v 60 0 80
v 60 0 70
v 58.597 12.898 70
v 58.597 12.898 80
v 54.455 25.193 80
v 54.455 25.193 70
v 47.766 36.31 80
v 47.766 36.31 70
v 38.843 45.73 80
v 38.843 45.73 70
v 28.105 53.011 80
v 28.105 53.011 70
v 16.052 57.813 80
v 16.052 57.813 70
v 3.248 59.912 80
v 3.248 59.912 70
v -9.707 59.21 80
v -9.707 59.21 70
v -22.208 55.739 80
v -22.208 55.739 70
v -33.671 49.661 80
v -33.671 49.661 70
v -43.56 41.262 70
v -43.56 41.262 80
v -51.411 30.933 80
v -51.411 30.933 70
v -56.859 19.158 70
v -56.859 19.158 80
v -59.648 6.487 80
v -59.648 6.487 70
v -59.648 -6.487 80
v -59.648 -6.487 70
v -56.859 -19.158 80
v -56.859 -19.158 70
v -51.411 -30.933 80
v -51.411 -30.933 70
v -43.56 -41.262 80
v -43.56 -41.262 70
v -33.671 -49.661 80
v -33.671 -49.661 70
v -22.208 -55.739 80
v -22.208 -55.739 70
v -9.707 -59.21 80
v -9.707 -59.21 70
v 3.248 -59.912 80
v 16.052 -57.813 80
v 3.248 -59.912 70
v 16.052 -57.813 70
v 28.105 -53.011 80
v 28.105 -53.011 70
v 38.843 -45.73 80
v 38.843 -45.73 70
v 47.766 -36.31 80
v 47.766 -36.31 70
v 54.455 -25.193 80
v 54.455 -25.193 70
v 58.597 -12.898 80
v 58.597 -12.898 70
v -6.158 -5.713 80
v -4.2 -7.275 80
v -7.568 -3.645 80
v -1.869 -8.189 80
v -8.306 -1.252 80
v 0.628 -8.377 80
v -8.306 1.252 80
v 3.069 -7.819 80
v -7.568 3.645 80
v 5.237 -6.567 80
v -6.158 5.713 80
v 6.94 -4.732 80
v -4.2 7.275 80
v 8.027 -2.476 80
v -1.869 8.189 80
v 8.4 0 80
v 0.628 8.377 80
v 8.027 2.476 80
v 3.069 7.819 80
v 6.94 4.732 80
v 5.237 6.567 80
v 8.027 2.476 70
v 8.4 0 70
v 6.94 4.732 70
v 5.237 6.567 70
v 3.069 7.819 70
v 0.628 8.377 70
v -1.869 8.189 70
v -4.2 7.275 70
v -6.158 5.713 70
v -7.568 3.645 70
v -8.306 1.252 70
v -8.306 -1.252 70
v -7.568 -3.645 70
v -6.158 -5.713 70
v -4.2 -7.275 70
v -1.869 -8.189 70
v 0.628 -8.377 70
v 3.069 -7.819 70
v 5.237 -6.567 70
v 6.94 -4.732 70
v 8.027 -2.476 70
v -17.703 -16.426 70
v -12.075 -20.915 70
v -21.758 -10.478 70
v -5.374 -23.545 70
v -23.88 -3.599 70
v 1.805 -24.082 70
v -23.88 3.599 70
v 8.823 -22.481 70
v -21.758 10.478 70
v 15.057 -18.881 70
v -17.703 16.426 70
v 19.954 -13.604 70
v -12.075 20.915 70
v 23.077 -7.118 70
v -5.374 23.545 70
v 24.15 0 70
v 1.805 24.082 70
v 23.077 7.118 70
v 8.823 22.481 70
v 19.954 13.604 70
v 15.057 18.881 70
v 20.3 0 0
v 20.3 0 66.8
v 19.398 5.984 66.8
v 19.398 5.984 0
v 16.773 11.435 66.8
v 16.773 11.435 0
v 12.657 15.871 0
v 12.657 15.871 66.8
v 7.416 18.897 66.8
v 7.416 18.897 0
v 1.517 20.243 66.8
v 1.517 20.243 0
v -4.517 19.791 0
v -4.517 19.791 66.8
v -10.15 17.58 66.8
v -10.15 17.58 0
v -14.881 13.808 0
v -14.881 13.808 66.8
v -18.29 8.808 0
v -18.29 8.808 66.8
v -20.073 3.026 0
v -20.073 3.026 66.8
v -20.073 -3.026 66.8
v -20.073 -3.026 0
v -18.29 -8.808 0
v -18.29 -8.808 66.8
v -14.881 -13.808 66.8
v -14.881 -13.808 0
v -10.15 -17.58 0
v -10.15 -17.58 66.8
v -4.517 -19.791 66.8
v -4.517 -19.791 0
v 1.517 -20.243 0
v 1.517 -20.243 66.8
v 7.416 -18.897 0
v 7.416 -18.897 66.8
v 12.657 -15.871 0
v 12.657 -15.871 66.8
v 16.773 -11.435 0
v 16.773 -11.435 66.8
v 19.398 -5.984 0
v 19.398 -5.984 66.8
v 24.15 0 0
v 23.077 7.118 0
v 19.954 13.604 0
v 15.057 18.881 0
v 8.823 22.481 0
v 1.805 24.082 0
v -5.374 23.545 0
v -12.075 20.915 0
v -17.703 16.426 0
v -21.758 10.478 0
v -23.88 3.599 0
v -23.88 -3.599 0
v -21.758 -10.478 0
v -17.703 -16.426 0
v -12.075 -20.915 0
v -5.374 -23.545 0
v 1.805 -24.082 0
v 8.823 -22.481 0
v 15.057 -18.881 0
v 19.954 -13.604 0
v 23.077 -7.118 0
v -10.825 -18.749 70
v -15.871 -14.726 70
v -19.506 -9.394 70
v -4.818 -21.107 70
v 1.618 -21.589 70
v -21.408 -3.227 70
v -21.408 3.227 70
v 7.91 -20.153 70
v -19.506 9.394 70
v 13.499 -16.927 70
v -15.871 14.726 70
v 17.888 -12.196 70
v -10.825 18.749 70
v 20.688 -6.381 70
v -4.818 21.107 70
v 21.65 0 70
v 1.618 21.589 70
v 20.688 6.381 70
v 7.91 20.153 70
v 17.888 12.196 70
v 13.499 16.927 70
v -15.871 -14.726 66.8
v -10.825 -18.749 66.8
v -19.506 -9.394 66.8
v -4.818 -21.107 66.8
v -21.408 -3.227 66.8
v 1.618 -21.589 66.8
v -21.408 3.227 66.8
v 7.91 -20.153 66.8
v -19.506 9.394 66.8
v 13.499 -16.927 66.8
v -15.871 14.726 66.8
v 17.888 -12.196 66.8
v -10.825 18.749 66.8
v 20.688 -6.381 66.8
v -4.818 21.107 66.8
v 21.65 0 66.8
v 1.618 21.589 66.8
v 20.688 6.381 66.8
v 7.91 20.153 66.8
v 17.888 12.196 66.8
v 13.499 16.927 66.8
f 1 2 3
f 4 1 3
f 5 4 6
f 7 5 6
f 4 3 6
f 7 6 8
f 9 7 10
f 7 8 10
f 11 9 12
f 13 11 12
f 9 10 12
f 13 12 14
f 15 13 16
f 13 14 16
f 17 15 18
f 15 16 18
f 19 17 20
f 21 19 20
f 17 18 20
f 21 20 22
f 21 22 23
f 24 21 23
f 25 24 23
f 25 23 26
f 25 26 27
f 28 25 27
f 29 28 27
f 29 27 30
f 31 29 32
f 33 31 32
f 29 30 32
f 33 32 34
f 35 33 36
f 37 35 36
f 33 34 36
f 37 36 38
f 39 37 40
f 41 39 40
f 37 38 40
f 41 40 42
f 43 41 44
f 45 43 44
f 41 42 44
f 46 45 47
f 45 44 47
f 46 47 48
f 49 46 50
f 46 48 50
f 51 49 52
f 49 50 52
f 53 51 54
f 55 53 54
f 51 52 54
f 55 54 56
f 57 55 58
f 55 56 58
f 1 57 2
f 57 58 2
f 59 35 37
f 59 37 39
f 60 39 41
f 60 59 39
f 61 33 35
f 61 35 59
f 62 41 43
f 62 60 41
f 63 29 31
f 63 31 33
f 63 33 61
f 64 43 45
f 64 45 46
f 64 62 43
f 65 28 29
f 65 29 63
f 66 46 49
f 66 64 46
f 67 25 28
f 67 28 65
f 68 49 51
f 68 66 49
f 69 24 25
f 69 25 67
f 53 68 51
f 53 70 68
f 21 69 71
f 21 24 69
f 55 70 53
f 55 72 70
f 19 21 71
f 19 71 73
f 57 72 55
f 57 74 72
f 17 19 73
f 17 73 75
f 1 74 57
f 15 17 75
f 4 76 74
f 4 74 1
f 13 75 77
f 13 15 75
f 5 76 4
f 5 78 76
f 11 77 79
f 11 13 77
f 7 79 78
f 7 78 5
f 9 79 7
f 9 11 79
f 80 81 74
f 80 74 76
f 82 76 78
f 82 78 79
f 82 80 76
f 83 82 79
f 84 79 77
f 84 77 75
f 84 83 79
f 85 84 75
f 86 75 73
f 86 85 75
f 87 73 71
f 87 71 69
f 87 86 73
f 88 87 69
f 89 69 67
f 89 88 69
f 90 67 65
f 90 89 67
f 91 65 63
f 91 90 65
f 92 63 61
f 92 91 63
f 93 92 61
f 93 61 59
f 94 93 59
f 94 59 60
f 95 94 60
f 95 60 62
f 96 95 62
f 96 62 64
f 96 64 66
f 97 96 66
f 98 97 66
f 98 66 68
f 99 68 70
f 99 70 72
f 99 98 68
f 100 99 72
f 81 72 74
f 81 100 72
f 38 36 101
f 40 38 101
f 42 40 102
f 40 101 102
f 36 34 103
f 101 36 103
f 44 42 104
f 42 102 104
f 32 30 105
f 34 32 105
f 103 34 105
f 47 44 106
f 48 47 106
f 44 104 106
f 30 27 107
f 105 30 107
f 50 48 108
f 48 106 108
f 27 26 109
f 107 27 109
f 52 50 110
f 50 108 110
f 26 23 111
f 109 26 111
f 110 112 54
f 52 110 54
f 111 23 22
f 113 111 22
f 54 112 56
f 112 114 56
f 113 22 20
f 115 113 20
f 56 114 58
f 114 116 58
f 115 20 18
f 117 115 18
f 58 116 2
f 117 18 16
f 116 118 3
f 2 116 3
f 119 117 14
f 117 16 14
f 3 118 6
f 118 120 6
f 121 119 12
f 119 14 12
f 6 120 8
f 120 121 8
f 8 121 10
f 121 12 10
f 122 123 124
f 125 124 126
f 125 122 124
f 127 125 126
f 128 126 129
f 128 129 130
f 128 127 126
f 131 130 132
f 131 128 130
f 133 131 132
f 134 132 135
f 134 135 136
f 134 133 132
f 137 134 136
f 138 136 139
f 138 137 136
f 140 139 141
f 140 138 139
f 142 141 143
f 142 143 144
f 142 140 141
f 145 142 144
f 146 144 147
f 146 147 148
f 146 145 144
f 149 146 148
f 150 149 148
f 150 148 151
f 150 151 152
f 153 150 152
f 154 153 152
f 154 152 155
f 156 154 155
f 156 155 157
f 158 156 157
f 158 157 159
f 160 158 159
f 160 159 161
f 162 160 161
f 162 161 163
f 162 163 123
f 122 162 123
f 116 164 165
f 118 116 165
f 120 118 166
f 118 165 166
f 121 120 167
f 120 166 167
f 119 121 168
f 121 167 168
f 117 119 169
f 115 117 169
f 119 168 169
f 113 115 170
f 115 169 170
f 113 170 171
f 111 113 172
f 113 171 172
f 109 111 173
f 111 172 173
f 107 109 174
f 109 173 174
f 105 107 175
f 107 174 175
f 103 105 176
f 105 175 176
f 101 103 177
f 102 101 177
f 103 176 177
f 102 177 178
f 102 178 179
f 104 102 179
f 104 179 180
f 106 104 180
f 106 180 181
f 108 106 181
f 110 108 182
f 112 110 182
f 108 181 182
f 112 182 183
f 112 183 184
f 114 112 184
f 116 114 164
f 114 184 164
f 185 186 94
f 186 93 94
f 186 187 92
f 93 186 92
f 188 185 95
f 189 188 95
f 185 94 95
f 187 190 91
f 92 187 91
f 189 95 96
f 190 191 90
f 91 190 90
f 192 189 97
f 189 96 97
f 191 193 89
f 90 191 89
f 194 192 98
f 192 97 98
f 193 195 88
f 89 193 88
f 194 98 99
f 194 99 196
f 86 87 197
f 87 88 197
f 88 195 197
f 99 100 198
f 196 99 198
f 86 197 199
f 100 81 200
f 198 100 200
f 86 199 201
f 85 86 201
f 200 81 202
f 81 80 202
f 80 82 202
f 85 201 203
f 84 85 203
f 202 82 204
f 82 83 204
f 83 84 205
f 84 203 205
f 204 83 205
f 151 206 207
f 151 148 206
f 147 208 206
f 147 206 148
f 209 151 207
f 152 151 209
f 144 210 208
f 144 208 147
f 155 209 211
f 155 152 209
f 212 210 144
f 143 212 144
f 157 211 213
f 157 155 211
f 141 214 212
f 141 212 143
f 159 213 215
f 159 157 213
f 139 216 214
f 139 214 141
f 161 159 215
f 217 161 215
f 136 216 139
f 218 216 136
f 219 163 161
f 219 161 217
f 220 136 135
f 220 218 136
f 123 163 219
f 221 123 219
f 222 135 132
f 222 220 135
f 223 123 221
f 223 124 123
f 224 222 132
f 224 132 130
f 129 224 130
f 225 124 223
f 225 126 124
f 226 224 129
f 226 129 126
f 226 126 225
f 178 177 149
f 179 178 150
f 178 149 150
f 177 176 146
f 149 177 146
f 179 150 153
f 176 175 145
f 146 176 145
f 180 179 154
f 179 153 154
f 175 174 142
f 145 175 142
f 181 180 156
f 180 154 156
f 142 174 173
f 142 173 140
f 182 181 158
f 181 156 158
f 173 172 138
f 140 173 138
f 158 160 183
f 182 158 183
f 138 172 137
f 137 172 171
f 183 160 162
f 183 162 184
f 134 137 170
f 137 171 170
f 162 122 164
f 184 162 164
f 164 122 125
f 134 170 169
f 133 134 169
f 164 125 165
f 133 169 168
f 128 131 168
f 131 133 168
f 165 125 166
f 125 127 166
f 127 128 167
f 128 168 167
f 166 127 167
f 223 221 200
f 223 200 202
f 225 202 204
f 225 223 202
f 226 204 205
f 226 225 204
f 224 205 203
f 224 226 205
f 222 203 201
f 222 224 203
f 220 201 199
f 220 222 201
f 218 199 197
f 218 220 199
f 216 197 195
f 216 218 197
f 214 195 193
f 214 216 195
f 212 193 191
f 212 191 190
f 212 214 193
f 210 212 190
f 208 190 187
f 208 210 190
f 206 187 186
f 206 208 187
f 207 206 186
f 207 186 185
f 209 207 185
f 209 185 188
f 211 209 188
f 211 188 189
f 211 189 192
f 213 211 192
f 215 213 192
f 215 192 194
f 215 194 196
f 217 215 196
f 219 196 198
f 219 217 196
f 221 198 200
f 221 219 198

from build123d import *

# Parameters (mm, degrees)
SKETCH1_R           = 24.15
SKETCH1_R_2         = 20.3
BOSS_EXTRUDE1_DEPTH = 70
CUT_EXTRUDE1_START  = -3.2
SKETCH2_R           = 21.65
SKETCH2_R_2         = 20.3
CUT_EXTRUDE1_DEPTH  = 3.2
SKETCH3_R           = 60
SKETCH3_R_2         = 8.4
BOSS_EXTRUDE2_DEPTH = 10


with BuildPart() as part:
    # Sketch1 → Boss-Extrude1 (new body)
    with BuildSketch(Plane.XY):
        Circle(SKETCH1_R)
        Circle(SKETCH1_R_2, mode=Mode.SUBTRACT)
    extrude(amount=BOSS_EXTRUDE1_DEPTH)

    # Sketch2 → Cut-Extrude1 (cut)
    with BuildSketch(Plane.XY.offset(70).offset(CUT_EXTRUDE1_START)):
        Circle(SKETCH2_R)
        Circle(SKETCH2_R_2, mode=Mode.SUBTRACT)
    extrude(amount=CUT_EXTRUDE1_DEPTH, mode=Mode.SUBTRACT)

    # Sketch3 → Boss-Extrude2 (add)
    with BuildSketch(Plane.XY.offset(70)):
        Circle(SKETCH3_R)
        Circle(SKETCH3_R_2, mode=Mode.SUBTRACT)
    extrude(amount=BOSS_EXTRUDE2_DEPTH)


solid = part.part
